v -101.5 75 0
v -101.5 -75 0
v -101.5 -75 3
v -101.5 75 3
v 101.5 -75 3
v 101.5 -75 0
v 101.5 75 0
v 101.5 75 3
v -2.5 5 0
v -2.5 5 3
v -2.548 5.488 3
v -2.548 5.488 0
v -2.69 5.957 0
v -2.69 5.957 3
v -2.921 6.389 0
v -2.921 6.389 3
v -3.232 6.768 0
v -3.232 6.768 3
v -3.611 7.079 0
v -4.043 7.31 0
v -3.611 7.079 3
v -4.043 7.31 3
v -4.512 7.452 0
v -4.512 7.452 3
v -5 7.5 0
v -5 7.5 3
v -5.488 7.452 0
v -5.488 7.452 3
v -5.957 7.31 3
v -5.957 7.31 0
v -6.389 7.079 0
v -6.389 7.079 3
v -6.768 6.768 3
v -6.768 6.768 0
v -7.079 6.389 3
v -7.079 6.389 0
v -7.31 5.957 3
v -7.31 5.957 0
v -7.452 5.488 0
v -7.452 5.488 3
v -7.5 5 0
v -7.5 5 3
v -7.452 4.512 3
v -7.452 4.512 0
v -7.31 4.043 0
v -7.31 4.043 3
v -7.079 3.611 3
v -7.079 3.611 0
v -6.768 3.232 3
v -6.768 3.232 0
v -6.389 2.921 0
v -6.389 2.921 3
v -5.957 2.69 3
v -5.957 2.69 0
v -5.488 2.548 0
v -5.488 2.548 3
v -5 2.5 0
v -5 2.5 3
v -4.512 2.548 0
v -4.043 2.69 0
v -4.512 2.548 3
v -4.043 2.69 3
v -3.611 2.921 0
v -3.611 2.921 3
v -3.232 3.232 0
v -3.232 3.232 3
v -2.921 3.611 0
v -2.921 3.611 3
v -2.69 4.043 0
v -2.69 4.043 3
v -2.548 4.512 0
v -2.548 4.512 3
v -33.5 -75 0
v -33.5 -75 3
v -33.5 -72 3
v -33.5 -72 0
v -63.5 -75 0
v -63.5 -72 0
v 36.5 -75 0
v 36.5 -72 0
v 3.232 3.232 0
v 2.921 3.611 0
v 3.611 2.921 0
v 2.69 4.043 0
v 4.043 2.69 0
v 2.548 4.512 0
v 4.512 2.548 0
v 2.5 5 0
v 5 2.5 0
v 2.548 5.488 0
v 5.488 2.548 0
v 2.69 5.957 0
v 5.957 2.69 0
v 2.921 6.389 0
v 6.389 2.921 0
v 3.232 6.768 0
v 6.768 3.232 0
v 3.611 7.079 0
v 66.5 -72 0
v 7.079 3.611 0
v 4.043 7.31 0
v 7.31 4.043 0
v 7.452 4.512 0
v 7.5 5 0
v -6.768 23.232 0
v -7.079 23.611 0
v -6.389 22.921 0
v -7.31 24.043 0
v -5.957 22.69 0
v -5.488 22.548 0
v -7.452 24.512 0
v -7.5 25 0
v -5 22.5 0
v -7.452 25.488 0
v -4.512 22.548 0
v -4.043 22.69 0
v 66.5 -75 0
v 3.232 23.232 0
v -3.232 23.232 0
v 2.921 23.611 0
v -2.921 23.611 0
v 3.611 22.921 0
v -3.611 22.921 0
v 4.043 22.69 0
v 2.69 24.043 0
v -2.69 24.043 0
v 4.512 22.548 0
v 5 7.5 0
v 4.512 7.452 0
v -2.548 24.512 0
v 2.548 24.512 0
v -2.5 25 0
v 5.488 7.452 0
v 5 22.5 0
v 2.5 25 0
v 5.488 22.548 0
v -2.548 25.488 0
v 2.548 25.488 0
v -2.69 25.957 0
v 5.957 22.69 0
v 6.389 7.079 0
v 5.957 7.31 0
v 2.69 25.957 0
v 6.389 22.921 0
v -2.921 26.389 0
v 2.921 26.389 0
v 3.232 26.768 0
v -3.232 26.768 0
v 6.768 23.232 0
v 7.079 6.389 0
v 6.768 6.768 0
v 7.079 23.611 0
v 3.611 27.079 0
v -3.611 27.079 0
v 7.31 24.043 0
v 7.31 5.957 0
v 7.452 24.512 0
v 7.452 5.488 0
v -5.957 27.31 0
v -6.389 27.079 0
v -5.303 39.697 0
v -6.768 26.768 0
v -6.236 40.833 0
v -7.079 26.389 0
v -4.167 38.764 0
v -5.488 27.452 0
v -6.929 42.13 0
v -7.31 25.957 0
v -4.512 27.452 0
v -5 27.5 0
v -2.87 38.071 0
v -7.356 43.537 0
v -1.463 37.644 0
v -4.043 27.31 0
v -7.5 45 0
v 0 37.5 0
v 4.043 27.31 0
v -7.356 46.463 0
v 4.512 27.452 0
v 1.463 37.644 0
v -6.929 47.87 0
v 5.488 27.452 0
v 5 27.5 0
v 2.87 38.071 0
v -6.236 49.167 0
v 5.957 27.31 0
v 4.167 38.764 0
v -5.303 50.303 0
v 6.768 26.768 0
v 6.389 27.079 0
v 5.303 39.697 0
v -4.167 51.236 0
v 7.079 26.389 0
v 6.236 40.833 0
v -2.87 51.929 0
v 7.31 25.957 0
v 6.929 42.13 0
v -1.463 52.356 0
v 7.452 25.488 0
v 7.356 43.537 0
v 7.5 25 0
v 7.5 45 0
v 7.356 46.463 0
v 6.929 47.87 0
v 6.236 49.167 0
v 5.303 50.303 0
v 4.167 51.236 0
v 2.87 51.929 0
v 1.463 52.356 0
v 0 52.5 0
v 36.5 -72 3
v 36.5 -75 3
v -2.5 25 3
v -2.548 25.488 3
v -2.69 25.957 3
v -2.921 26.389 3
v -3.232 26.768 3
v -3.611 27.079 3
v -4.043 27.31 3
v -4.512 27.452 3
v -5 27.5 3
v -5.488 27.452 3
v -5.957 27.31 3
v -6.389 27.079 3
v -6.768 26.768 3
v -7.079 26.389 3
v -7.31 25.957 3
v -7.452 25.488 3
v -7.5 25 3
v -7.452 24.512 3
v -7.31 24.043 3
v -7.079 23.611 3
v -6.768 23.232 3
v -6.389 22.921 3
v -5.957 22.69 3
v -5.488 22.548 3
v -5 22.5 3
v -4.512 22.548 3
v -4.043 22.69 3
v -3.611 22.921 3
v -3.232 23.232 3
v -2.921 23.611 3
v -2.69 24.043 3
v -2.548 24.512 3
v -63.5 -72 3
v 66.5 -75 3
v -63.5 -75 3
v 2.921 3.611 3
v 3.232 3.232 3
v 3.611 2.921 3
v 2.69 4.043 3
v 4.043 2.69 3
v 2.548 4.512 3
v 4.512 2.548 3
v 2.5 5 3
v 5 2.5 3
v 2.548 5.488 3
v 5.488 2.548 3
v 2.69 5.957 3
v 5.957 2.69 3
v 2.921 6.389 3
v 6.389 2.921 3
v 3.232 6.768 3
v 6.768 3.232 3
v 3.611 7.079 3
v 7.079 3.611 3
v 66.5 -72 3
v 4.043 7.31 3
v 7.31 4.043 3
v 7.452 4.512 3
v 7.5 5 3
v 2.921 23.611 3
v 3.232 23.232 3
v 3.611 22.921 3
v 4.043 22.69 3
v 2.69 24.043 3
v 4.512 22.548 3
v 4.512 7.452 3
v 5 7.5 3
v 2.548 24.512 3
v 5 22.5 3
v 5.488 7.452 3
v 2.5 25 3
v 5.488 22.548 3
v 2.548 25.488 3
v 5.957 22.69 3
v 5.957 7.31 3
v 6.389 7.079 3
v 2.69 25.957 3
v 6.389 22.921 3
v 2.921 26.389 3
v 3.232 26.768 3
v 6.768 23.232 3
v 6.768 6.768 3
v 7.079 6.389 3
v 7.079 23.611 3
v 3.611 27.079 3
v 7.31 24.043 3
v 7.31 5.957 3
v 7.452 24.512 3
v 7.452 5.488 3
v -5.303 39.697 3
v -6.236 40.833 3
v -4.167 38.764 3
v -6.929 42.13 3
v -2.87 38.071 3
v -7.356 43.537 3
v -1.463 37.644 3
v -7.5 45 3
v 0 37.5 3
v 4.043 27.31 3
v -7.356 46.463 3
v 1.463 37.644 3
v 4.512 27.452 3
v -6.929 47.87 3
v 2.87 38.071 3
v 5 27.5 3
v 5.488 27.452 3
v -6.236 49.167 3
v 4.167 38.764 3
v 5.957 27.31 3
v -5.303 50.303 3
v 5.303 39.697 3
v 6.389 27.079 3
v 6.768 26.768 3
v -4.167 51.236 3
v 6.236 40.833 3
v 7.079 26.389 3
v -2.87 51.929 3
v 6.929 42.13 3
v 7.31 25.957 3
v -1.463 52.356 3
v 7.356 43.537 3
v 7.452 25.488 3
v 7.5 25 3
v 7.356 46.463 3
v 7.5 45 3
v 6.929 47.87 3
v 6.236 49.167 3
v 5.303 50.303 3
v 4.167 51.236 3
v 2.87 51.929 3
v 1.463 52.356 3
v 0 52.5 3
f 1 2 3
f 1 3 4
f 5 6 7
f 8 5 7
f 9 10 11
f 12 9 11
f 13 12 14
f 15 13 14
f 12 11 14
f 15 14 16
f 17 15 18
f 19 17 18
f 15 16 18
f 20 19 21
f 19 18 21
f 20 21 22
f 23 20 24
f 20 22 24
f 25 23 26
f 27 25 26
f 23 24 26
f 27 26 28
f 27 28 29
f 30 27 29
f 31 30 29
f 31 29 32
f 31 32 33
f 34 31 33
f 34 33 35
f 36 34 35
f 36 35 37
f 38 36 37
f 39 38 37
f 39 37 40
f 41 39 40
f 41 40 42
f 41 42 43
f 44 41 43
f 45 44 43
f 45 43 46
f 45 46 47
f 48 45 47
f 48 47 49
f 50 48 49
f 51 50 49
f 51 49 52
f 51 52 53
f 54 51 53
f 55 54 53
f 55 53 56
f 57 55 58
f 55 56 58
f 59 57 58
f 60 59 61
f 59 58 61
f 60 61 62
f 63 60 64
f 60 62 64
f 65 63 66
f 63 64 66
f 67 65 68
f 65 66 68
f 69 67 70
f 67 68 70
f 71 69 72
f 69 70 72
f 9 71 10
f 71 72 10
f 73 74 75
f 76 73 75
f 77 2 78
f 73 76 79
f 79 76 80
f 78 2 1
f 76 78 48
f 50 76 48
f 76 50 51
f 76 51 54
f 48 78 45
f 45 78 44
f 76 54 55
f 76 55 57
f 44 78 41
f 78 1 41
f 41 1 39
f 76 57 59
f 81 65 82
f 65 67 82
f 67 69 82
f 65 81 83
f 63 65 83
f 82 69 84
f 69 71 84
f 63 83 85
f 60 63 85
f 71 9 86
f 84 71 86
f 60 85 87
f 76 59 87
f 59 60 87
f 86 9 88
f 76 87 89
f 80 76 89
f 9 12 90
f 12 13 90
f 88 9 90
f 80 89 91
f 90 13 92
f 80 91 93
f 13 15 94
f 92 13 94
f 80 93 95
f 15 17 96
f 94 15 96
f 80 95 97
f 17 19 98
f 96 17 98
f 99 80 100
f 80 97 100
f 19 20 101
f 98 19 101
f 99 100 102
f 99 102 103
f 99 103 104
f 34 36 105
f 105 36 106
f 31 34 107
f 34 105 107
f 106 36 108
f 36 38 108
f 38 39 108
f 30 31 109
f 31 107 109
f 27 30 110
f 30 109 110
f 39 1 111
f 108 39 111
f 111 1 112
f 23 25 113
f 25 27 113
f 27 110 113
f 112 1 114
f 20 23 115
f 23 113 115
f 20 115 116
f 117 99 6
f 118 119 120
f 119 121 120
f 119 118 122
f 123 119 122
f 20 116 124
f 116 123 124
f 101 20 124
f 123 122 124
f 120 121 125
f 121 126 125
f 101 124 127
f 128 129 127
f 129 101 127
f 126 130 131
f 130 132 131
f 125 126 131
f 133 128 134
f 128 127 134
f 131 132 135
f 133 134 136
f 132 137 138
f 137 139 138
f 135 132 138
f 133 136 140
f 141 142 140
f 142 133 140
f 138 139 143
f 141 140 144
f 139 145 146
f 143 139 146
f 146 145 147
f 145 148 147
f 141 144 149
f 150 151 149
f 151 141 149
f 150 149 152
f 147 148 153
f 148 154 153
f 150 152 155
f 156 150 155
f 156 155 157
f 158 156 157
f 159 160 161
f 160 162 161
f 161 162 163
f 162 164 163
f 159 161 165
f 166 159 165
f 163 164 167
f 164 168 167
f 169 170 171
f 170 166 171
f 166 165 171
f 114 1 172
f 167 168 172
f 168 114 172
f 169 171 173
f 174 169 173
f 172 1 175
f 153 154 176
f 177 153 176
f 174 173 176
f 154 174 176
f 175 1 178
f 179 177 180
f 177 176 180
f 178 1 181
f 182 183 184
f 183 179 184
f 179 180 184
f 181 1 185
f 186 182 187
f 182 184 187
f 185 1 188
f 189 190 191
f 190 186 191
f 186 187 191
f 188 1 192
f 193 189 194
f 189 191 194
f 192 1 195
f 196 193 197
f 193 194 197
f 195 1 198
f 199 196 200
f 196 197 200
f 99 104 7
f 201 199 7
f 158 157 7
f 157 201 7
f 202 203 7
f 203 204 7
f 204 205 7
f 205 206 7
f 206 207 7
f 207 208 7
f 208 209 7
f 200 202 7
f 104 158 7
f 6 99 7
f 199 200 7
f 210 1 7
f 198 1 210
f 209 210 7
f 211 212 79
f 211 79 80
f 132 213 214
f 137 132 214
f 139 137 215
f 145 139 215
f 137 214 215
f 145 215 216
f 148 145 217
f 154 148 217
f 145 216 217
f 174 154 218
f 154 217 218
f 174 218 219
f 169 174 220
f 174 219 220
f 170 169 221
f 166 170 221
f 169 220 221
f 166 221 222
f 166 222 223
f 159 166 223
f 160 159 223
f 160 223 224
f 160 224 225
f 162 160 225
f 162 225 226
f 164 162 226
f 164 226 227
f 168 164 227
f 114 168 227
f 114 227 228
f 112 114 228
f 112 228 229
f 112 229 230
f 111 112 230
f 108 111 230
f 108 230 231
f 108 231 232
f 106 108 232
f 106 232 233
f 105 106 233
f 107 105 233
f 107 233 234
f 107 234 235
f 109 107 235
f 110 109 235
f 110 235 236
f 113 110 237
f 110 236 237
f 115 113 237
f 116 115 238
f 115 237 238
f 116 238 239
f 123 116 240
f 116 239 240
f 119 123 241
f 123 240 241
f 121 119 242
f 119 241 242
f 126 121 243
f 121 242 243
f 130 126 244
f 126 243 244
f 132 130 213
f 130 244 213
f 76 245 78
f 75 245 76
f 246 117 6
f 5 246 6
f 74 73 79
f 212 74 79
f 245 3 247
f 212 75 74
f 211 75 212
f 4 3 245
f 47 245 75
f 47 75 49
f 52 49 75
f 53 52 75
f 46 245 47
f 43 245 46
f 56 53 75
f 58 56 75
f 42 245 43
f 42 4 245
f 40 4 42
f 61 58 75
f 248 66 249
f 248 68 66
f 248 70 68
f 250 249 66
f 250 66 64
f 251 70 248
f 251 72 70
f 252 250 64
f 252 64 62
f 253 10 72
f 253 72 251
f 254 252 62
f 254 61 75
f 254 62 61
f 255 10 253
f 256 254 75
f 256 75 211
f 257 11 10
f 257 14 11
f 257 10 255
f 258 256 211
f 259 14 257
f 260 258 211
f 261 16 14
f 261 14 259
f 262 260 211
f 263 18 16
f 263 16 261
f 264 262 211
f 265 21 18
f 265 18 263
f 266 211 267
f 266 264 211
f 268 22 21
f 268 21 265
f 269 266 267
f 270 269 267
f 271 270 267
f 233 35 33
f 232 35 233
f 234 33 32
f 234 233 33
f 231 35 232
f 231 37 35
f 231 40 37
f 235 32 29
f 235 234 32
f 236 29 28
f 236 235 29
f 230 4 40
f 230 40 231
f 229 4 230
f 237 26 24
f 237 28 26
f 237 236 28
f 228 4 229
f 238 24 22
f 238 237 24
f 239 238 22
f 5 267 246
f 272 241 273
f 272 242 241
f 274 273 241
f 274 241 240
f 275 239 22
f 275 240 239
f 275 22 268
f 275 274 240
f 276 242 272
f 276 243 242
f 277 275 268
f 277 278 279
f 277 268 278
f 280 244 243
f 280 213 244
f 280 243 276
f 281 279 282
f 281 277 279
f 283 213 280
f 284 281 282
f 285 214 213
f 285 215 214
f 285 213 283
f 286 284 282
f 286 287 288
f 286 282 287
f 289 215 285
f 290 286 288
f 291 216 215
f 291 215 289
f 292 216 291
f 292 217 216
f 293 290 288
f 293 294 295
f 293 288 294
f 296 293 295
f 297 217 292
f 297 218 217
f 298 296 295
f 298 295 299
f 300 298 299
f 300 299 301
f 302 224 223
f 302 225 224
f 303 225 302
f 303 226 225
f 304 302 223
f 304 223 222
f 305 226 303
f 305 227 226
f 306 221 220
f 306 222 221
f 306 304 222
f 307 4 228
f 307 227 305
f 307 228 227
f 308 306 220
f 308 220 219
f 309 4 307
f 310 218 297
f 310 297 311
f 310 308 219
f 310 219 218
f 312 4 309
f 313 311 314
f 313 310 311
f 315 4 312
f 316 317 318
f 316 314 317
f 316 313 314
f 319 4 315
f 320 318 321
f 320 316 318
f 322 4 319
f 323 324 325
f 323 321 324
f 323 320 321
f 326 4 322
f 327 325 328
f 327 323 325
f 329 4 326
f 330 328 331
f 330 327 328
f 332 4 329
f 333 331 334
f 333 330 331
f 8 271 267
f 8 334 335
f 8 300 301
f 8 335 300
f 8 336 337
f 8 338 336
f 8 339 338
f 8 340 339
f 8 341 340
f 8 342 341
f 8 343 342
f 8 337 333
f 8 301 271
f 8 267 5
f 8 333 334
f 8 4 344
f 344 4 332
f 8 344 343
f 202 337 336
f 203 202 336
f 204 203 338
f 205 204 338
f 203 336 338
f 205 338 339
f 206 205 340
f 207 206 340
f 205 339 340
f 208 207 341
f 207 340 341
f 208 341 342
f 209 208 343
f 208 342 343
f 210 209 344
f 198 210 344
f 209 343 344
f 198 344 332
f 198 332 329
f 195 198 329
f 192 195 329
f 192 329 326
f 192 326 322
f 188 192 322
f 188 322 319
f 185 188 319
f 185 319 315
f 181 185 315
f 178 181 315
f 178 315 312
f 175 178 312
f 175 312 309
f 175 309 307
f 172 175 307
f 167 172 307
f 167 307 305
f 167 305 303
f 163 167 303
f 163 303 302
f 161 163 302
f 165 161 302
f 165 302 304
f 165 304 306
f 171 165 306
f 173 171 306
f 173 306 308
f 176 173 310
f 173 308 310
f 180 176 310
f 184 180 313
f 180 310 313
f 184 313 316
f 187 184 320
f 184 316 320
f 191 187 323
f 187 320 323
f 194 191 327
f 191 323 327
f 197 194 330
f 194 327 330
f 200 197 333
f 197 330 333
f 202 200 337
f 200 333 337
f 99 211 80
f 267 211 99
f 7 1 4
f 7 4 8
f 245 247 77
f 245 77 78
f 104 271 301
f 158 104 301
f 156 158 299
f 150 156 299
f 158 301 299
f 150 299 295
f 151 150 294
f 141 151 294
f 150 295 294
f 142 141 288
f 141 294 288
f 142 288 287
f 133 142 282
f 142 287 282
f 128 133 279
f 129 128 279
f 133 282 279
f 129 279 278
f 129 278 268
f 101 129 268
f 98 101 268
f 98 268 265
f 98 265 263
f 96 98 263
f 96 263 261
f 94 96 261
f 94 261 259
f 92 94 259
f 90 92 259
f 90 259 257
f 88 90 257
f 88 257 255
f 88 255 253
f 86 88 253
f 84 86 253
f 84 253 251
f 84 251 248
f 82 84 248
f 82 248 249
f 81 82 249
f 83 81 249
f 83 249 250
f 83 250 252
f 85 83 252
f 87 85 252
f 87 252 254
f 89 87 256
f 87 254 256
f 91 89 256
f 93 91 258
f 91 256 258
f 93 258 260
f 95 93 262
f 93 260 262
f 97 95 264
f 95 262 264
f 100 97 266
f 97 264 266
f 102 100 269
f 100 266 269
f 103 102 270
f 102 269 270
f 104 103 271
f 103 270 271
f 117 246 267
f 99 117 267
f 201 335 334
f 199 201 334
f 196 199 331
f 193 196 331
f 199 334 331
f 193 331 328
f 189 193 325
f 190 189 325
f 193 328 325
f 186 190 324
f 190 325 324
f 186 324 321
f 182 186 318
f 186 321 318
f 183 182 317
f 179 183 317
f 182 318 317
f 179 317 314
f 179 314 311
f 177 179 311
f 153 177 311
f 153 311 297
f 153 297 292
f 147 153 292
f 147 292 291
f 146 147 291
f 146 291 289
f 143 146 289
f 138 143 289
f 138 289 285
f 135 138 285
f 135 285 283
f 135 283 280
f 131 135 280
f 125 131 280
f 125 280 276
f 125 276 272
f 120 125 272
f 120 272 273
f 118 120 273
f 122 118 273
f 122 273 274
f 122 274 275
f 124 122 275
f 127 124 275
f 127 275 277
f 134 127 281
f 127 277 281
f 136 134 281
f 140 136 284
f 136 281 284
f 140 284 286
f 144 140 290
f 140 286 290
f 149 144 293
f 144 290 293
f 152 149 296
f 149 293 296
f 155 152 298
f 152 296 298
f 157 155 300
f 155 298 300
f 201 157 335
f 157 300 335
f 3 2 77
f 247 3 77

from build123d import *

# Parameters (mm, degrees)
SKETCH1_W           = 203
SKETCH1_H           = 150
BOSS_EXTRUDE1_DEPTH = 3
SKETCH3_R           = 7.5
SKETCH3_R_2         = 2.5
CUT_EXTRUDE2_DEPTH  = 10
SKETCH4_W           = 30
SKETCH4_H           = 3
CUT_EXTRUDE3_DEPTH  = 10


with BuildPart() as part:
    # Sketch1 → Boss-Extrude1 (new body)
    with BuildSketch(Plane.XY):
        Rectangle(SKETCH1_W, SKETCH1_H)
    extrude(amount=BOSS_EXTRUDE1_DEPTH)

    # Sketch3 → Cut-Extrude2 (cut)
    with BuildSketch(Plane.XY.offset(3)):
        with Locations((0, 45)):
            Circle(SKETCH3_R)
        with Locations((-5, 25)):
            Circle(SKETCH3_R_2)
        with Locations((-5, 5)):
            Circle(SKETCH3_R_2)
        with Locations((5, 5)):
            Circle(SKETCH3_R_2)
        with Locations((5, 25)):
            Circle(SKETCH3_R_2)
    extrude(amount=-CUT_EXTRUDE2_DEPTH, mode=Mode.SUBTRACT)

    # Sketch4 → Cut-Extrude3 (cut)
    with BuildSketch(Plane.XY.offset(3)):
        with Locations((-48.5, -73.5)):
            Rectangle(SKETCH4_W, SKETCH4_H)
        with Locations((51.5, -73.5)):
            Rectangle(SKETCH4_W, SKETCH4_H)
    extrude(amount=-CUT_EXTRUDE3_DEPTH, mode=Mode.SUBTRACT)


solid = part.part
